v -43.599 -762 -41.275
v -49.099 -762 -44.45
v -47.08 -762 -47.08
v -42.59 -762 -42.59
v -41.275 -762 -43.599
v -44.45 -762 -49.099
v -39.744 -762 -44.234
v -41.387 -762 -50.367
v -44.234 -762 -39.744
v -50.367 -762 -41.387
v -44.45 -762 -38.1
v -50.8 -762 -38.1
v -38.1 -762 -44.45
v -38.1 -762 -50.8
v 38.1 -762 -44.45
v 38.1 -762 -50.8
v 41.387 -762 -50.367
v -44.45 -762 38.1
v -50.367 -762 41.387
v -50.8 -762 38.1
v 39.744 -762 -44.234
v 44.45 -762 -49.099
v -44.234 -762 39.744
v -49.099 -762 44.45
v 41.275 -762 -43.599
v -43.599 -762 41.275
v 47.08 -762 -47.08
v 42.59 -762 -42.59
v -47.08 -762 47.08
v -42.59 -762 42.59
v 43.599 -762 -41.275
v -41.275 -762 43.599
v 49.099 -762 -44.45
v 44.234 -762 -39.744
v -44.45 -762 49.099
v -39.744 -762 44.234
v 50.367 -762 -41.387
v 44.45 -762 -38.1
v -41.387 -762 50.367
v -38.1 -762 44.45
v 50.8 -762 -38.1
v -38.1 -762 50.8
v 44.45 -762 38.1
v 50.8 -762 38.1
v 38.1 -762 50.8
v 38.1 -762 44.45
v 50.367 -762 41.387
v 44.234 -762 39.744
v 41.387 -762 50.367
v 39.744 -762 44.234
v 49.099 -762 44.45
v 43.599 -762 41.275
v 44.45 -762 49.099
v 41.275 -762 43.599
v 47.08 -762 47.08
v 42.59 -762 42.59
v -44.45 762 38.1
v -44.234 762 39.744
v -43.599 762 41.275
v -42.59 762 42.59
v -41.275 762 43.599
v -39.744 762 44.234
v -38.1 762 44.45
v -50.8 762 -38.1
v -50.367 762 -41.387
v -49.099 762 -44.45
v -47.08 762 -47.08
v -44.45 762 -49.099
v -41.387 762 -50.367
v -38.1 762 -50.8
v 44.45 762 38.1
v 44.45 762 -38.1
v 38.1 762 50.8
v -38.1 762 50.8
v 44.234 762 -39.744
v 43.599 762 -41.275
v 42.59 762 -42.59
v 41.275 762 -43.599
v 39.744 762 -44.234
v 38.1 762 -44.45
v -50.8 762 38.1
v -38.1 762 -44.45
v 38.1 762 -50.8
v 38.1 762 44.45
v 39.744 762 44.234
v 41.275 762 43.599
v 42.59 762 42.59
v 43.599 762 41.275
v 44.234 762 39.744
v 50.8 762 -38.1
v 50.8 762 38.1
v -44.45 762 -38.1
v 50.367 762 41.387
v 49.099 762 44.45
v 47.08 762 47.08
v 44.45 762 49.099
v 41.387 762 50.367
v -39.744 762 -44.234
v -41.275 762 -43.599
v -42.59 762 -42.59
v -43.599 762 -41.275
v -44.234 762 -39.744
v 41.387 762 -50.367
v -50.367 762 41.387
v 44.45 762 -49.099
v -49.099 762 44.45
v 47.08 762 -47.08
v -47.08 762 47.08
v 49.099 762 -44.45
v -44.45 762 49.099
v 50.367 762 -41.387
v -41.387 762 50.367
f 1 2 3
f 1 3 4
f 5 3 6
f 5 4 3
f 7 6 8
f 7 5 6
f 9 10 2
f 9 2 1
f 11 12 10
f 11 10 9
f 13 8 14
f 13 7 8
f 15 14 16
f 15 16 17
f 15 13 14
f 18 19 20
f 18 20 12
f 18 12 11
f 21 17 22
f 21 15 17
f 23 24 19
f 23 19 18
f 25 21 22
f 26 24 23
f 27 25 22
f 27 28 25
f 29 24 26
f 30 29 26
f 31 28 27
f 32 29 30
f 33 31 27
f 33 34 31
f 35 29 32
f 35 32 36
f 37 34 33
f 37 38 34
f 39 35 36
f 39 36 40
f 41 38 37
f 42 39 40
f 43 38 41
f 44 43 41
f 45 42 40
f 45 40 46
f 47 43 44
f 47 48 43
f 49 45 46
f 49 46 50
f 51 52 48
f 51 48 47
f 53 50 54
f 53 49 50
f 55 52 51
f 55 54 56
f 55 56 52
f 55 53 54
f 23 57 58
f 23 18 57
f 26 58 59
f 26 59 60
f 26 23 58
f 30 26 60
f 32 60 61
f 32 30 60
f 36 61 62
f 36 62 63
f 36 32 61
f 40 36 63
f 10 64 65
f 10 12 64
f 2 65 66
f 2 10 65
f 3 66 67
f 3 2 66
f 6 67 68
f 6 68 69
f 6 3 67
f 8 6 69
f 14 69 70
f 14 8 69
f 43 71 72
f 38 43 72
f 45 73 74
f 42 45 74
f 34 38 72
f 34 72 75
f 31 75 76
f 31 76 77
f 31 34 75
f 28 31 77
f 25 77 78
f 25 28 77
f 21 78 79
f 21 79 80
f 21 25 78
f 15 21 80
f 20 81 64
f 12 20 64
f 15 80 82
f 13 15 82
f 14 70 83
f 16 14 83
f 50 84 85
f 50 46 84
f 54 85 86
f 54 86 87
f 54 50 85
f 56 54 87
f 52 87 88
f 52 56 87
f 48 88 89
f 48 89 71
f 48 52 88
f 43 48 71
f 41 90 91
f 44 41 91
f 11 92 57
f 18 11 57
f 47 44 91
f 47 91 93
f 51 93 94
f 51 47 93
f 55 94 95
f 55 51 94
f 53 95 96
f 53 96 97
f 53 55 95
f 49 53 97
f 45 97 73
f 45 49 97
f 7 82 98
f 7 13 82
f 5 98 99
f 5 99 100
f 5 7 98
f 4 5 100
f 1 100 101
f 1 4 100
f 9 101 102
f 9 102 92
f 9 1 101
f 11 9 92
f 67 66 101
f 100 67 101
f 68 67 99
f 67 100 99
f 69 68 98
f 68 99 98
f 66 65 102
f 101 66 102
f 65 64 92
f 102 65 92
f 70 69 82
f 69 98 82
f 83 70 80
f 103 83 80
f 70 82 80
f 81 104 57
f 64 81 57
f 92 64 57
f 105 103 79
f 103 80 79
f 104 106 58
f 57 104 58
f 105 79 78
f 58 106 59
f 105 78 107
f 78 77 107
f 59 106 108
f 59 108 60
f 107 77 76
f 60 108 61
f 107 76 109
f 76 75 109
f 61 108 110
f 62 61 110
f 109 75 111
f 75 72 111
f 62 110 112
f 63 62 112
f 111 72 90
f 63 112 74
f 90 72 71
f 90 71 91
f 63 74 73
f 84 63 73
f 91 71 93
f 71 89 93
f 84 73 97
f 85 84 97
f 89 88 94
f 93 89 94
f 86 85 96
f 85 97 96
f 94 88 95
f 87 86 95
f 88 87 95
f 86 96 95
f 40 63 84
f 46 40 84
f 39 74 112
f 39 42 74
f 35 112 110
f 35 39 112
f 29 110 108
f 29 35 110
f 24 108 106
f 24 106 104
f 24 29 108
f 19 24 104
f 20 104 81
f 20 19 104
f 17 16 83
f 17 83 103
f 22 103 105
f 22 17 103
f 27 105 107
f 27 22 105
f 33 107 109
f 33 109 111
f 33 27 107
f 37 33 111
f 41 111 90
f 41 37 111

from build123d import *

# Parameters (mm, degrees)
F1_DEPTH = 762


with BuildPart() as f1:
    # F0 (on Front) → F1 (new body, symmetric)
    with BuildSketch(Plane.XZ):
        with BuildLine():
            Line((-38.1, -50.8), (38.1, -50.8))
            ThreePointArc((38.1, -50.8), (47.080256, -47.080256), (50.8, -38.1))
            Line((50.8, -38.1), (50.8, 38.1))
            ThreePointArc((50.8, 38.1), (47.080256, 47.080256), (38.1, 50.8))
            Line((38.1, 50.8), (-38.1, 50.8))
            ThreePointArc((-38.1, 50.8), (-47.080256, 47.080256), (-50.8, 38.1))
            Line((-50.8, 38.1), (-50.8, -38.1))
            ThreePointArc((-50.8, -38.1), (-47.080256, -47.080256), (-38.1, -50.8))
        make_face()
        with BuildLine():
            ThreePointArc((44.45, -38.1), (42.590128, -42.590128), (38.1, -44.45))
            Line((38.1, -44.45), (-38.1, -44.45))
            ThreePointArc((-38.1, -44.45), (-42.590128, -42.590128), (-44.45, -38.1))
            Line((-44.45, -38.1), (-44.45, 38.1))
            ThreePointArc((-44.45, 38.1), (-42.590128, 42.590128), (-38.1, 44.45))
            Line((-38.1, 44.45), (38.1, 44.45))
            ThreePointArc((38.1, 44.45), (42.590128, 42.590128), (44.45, 38.1))
            Line((44.45, 38.1), (44.45, -38.1))
        make_face(mode=Mode.SUBTRACT)
    extrude(amount=F1_DEPTH, both=True)


solid = f1.part
